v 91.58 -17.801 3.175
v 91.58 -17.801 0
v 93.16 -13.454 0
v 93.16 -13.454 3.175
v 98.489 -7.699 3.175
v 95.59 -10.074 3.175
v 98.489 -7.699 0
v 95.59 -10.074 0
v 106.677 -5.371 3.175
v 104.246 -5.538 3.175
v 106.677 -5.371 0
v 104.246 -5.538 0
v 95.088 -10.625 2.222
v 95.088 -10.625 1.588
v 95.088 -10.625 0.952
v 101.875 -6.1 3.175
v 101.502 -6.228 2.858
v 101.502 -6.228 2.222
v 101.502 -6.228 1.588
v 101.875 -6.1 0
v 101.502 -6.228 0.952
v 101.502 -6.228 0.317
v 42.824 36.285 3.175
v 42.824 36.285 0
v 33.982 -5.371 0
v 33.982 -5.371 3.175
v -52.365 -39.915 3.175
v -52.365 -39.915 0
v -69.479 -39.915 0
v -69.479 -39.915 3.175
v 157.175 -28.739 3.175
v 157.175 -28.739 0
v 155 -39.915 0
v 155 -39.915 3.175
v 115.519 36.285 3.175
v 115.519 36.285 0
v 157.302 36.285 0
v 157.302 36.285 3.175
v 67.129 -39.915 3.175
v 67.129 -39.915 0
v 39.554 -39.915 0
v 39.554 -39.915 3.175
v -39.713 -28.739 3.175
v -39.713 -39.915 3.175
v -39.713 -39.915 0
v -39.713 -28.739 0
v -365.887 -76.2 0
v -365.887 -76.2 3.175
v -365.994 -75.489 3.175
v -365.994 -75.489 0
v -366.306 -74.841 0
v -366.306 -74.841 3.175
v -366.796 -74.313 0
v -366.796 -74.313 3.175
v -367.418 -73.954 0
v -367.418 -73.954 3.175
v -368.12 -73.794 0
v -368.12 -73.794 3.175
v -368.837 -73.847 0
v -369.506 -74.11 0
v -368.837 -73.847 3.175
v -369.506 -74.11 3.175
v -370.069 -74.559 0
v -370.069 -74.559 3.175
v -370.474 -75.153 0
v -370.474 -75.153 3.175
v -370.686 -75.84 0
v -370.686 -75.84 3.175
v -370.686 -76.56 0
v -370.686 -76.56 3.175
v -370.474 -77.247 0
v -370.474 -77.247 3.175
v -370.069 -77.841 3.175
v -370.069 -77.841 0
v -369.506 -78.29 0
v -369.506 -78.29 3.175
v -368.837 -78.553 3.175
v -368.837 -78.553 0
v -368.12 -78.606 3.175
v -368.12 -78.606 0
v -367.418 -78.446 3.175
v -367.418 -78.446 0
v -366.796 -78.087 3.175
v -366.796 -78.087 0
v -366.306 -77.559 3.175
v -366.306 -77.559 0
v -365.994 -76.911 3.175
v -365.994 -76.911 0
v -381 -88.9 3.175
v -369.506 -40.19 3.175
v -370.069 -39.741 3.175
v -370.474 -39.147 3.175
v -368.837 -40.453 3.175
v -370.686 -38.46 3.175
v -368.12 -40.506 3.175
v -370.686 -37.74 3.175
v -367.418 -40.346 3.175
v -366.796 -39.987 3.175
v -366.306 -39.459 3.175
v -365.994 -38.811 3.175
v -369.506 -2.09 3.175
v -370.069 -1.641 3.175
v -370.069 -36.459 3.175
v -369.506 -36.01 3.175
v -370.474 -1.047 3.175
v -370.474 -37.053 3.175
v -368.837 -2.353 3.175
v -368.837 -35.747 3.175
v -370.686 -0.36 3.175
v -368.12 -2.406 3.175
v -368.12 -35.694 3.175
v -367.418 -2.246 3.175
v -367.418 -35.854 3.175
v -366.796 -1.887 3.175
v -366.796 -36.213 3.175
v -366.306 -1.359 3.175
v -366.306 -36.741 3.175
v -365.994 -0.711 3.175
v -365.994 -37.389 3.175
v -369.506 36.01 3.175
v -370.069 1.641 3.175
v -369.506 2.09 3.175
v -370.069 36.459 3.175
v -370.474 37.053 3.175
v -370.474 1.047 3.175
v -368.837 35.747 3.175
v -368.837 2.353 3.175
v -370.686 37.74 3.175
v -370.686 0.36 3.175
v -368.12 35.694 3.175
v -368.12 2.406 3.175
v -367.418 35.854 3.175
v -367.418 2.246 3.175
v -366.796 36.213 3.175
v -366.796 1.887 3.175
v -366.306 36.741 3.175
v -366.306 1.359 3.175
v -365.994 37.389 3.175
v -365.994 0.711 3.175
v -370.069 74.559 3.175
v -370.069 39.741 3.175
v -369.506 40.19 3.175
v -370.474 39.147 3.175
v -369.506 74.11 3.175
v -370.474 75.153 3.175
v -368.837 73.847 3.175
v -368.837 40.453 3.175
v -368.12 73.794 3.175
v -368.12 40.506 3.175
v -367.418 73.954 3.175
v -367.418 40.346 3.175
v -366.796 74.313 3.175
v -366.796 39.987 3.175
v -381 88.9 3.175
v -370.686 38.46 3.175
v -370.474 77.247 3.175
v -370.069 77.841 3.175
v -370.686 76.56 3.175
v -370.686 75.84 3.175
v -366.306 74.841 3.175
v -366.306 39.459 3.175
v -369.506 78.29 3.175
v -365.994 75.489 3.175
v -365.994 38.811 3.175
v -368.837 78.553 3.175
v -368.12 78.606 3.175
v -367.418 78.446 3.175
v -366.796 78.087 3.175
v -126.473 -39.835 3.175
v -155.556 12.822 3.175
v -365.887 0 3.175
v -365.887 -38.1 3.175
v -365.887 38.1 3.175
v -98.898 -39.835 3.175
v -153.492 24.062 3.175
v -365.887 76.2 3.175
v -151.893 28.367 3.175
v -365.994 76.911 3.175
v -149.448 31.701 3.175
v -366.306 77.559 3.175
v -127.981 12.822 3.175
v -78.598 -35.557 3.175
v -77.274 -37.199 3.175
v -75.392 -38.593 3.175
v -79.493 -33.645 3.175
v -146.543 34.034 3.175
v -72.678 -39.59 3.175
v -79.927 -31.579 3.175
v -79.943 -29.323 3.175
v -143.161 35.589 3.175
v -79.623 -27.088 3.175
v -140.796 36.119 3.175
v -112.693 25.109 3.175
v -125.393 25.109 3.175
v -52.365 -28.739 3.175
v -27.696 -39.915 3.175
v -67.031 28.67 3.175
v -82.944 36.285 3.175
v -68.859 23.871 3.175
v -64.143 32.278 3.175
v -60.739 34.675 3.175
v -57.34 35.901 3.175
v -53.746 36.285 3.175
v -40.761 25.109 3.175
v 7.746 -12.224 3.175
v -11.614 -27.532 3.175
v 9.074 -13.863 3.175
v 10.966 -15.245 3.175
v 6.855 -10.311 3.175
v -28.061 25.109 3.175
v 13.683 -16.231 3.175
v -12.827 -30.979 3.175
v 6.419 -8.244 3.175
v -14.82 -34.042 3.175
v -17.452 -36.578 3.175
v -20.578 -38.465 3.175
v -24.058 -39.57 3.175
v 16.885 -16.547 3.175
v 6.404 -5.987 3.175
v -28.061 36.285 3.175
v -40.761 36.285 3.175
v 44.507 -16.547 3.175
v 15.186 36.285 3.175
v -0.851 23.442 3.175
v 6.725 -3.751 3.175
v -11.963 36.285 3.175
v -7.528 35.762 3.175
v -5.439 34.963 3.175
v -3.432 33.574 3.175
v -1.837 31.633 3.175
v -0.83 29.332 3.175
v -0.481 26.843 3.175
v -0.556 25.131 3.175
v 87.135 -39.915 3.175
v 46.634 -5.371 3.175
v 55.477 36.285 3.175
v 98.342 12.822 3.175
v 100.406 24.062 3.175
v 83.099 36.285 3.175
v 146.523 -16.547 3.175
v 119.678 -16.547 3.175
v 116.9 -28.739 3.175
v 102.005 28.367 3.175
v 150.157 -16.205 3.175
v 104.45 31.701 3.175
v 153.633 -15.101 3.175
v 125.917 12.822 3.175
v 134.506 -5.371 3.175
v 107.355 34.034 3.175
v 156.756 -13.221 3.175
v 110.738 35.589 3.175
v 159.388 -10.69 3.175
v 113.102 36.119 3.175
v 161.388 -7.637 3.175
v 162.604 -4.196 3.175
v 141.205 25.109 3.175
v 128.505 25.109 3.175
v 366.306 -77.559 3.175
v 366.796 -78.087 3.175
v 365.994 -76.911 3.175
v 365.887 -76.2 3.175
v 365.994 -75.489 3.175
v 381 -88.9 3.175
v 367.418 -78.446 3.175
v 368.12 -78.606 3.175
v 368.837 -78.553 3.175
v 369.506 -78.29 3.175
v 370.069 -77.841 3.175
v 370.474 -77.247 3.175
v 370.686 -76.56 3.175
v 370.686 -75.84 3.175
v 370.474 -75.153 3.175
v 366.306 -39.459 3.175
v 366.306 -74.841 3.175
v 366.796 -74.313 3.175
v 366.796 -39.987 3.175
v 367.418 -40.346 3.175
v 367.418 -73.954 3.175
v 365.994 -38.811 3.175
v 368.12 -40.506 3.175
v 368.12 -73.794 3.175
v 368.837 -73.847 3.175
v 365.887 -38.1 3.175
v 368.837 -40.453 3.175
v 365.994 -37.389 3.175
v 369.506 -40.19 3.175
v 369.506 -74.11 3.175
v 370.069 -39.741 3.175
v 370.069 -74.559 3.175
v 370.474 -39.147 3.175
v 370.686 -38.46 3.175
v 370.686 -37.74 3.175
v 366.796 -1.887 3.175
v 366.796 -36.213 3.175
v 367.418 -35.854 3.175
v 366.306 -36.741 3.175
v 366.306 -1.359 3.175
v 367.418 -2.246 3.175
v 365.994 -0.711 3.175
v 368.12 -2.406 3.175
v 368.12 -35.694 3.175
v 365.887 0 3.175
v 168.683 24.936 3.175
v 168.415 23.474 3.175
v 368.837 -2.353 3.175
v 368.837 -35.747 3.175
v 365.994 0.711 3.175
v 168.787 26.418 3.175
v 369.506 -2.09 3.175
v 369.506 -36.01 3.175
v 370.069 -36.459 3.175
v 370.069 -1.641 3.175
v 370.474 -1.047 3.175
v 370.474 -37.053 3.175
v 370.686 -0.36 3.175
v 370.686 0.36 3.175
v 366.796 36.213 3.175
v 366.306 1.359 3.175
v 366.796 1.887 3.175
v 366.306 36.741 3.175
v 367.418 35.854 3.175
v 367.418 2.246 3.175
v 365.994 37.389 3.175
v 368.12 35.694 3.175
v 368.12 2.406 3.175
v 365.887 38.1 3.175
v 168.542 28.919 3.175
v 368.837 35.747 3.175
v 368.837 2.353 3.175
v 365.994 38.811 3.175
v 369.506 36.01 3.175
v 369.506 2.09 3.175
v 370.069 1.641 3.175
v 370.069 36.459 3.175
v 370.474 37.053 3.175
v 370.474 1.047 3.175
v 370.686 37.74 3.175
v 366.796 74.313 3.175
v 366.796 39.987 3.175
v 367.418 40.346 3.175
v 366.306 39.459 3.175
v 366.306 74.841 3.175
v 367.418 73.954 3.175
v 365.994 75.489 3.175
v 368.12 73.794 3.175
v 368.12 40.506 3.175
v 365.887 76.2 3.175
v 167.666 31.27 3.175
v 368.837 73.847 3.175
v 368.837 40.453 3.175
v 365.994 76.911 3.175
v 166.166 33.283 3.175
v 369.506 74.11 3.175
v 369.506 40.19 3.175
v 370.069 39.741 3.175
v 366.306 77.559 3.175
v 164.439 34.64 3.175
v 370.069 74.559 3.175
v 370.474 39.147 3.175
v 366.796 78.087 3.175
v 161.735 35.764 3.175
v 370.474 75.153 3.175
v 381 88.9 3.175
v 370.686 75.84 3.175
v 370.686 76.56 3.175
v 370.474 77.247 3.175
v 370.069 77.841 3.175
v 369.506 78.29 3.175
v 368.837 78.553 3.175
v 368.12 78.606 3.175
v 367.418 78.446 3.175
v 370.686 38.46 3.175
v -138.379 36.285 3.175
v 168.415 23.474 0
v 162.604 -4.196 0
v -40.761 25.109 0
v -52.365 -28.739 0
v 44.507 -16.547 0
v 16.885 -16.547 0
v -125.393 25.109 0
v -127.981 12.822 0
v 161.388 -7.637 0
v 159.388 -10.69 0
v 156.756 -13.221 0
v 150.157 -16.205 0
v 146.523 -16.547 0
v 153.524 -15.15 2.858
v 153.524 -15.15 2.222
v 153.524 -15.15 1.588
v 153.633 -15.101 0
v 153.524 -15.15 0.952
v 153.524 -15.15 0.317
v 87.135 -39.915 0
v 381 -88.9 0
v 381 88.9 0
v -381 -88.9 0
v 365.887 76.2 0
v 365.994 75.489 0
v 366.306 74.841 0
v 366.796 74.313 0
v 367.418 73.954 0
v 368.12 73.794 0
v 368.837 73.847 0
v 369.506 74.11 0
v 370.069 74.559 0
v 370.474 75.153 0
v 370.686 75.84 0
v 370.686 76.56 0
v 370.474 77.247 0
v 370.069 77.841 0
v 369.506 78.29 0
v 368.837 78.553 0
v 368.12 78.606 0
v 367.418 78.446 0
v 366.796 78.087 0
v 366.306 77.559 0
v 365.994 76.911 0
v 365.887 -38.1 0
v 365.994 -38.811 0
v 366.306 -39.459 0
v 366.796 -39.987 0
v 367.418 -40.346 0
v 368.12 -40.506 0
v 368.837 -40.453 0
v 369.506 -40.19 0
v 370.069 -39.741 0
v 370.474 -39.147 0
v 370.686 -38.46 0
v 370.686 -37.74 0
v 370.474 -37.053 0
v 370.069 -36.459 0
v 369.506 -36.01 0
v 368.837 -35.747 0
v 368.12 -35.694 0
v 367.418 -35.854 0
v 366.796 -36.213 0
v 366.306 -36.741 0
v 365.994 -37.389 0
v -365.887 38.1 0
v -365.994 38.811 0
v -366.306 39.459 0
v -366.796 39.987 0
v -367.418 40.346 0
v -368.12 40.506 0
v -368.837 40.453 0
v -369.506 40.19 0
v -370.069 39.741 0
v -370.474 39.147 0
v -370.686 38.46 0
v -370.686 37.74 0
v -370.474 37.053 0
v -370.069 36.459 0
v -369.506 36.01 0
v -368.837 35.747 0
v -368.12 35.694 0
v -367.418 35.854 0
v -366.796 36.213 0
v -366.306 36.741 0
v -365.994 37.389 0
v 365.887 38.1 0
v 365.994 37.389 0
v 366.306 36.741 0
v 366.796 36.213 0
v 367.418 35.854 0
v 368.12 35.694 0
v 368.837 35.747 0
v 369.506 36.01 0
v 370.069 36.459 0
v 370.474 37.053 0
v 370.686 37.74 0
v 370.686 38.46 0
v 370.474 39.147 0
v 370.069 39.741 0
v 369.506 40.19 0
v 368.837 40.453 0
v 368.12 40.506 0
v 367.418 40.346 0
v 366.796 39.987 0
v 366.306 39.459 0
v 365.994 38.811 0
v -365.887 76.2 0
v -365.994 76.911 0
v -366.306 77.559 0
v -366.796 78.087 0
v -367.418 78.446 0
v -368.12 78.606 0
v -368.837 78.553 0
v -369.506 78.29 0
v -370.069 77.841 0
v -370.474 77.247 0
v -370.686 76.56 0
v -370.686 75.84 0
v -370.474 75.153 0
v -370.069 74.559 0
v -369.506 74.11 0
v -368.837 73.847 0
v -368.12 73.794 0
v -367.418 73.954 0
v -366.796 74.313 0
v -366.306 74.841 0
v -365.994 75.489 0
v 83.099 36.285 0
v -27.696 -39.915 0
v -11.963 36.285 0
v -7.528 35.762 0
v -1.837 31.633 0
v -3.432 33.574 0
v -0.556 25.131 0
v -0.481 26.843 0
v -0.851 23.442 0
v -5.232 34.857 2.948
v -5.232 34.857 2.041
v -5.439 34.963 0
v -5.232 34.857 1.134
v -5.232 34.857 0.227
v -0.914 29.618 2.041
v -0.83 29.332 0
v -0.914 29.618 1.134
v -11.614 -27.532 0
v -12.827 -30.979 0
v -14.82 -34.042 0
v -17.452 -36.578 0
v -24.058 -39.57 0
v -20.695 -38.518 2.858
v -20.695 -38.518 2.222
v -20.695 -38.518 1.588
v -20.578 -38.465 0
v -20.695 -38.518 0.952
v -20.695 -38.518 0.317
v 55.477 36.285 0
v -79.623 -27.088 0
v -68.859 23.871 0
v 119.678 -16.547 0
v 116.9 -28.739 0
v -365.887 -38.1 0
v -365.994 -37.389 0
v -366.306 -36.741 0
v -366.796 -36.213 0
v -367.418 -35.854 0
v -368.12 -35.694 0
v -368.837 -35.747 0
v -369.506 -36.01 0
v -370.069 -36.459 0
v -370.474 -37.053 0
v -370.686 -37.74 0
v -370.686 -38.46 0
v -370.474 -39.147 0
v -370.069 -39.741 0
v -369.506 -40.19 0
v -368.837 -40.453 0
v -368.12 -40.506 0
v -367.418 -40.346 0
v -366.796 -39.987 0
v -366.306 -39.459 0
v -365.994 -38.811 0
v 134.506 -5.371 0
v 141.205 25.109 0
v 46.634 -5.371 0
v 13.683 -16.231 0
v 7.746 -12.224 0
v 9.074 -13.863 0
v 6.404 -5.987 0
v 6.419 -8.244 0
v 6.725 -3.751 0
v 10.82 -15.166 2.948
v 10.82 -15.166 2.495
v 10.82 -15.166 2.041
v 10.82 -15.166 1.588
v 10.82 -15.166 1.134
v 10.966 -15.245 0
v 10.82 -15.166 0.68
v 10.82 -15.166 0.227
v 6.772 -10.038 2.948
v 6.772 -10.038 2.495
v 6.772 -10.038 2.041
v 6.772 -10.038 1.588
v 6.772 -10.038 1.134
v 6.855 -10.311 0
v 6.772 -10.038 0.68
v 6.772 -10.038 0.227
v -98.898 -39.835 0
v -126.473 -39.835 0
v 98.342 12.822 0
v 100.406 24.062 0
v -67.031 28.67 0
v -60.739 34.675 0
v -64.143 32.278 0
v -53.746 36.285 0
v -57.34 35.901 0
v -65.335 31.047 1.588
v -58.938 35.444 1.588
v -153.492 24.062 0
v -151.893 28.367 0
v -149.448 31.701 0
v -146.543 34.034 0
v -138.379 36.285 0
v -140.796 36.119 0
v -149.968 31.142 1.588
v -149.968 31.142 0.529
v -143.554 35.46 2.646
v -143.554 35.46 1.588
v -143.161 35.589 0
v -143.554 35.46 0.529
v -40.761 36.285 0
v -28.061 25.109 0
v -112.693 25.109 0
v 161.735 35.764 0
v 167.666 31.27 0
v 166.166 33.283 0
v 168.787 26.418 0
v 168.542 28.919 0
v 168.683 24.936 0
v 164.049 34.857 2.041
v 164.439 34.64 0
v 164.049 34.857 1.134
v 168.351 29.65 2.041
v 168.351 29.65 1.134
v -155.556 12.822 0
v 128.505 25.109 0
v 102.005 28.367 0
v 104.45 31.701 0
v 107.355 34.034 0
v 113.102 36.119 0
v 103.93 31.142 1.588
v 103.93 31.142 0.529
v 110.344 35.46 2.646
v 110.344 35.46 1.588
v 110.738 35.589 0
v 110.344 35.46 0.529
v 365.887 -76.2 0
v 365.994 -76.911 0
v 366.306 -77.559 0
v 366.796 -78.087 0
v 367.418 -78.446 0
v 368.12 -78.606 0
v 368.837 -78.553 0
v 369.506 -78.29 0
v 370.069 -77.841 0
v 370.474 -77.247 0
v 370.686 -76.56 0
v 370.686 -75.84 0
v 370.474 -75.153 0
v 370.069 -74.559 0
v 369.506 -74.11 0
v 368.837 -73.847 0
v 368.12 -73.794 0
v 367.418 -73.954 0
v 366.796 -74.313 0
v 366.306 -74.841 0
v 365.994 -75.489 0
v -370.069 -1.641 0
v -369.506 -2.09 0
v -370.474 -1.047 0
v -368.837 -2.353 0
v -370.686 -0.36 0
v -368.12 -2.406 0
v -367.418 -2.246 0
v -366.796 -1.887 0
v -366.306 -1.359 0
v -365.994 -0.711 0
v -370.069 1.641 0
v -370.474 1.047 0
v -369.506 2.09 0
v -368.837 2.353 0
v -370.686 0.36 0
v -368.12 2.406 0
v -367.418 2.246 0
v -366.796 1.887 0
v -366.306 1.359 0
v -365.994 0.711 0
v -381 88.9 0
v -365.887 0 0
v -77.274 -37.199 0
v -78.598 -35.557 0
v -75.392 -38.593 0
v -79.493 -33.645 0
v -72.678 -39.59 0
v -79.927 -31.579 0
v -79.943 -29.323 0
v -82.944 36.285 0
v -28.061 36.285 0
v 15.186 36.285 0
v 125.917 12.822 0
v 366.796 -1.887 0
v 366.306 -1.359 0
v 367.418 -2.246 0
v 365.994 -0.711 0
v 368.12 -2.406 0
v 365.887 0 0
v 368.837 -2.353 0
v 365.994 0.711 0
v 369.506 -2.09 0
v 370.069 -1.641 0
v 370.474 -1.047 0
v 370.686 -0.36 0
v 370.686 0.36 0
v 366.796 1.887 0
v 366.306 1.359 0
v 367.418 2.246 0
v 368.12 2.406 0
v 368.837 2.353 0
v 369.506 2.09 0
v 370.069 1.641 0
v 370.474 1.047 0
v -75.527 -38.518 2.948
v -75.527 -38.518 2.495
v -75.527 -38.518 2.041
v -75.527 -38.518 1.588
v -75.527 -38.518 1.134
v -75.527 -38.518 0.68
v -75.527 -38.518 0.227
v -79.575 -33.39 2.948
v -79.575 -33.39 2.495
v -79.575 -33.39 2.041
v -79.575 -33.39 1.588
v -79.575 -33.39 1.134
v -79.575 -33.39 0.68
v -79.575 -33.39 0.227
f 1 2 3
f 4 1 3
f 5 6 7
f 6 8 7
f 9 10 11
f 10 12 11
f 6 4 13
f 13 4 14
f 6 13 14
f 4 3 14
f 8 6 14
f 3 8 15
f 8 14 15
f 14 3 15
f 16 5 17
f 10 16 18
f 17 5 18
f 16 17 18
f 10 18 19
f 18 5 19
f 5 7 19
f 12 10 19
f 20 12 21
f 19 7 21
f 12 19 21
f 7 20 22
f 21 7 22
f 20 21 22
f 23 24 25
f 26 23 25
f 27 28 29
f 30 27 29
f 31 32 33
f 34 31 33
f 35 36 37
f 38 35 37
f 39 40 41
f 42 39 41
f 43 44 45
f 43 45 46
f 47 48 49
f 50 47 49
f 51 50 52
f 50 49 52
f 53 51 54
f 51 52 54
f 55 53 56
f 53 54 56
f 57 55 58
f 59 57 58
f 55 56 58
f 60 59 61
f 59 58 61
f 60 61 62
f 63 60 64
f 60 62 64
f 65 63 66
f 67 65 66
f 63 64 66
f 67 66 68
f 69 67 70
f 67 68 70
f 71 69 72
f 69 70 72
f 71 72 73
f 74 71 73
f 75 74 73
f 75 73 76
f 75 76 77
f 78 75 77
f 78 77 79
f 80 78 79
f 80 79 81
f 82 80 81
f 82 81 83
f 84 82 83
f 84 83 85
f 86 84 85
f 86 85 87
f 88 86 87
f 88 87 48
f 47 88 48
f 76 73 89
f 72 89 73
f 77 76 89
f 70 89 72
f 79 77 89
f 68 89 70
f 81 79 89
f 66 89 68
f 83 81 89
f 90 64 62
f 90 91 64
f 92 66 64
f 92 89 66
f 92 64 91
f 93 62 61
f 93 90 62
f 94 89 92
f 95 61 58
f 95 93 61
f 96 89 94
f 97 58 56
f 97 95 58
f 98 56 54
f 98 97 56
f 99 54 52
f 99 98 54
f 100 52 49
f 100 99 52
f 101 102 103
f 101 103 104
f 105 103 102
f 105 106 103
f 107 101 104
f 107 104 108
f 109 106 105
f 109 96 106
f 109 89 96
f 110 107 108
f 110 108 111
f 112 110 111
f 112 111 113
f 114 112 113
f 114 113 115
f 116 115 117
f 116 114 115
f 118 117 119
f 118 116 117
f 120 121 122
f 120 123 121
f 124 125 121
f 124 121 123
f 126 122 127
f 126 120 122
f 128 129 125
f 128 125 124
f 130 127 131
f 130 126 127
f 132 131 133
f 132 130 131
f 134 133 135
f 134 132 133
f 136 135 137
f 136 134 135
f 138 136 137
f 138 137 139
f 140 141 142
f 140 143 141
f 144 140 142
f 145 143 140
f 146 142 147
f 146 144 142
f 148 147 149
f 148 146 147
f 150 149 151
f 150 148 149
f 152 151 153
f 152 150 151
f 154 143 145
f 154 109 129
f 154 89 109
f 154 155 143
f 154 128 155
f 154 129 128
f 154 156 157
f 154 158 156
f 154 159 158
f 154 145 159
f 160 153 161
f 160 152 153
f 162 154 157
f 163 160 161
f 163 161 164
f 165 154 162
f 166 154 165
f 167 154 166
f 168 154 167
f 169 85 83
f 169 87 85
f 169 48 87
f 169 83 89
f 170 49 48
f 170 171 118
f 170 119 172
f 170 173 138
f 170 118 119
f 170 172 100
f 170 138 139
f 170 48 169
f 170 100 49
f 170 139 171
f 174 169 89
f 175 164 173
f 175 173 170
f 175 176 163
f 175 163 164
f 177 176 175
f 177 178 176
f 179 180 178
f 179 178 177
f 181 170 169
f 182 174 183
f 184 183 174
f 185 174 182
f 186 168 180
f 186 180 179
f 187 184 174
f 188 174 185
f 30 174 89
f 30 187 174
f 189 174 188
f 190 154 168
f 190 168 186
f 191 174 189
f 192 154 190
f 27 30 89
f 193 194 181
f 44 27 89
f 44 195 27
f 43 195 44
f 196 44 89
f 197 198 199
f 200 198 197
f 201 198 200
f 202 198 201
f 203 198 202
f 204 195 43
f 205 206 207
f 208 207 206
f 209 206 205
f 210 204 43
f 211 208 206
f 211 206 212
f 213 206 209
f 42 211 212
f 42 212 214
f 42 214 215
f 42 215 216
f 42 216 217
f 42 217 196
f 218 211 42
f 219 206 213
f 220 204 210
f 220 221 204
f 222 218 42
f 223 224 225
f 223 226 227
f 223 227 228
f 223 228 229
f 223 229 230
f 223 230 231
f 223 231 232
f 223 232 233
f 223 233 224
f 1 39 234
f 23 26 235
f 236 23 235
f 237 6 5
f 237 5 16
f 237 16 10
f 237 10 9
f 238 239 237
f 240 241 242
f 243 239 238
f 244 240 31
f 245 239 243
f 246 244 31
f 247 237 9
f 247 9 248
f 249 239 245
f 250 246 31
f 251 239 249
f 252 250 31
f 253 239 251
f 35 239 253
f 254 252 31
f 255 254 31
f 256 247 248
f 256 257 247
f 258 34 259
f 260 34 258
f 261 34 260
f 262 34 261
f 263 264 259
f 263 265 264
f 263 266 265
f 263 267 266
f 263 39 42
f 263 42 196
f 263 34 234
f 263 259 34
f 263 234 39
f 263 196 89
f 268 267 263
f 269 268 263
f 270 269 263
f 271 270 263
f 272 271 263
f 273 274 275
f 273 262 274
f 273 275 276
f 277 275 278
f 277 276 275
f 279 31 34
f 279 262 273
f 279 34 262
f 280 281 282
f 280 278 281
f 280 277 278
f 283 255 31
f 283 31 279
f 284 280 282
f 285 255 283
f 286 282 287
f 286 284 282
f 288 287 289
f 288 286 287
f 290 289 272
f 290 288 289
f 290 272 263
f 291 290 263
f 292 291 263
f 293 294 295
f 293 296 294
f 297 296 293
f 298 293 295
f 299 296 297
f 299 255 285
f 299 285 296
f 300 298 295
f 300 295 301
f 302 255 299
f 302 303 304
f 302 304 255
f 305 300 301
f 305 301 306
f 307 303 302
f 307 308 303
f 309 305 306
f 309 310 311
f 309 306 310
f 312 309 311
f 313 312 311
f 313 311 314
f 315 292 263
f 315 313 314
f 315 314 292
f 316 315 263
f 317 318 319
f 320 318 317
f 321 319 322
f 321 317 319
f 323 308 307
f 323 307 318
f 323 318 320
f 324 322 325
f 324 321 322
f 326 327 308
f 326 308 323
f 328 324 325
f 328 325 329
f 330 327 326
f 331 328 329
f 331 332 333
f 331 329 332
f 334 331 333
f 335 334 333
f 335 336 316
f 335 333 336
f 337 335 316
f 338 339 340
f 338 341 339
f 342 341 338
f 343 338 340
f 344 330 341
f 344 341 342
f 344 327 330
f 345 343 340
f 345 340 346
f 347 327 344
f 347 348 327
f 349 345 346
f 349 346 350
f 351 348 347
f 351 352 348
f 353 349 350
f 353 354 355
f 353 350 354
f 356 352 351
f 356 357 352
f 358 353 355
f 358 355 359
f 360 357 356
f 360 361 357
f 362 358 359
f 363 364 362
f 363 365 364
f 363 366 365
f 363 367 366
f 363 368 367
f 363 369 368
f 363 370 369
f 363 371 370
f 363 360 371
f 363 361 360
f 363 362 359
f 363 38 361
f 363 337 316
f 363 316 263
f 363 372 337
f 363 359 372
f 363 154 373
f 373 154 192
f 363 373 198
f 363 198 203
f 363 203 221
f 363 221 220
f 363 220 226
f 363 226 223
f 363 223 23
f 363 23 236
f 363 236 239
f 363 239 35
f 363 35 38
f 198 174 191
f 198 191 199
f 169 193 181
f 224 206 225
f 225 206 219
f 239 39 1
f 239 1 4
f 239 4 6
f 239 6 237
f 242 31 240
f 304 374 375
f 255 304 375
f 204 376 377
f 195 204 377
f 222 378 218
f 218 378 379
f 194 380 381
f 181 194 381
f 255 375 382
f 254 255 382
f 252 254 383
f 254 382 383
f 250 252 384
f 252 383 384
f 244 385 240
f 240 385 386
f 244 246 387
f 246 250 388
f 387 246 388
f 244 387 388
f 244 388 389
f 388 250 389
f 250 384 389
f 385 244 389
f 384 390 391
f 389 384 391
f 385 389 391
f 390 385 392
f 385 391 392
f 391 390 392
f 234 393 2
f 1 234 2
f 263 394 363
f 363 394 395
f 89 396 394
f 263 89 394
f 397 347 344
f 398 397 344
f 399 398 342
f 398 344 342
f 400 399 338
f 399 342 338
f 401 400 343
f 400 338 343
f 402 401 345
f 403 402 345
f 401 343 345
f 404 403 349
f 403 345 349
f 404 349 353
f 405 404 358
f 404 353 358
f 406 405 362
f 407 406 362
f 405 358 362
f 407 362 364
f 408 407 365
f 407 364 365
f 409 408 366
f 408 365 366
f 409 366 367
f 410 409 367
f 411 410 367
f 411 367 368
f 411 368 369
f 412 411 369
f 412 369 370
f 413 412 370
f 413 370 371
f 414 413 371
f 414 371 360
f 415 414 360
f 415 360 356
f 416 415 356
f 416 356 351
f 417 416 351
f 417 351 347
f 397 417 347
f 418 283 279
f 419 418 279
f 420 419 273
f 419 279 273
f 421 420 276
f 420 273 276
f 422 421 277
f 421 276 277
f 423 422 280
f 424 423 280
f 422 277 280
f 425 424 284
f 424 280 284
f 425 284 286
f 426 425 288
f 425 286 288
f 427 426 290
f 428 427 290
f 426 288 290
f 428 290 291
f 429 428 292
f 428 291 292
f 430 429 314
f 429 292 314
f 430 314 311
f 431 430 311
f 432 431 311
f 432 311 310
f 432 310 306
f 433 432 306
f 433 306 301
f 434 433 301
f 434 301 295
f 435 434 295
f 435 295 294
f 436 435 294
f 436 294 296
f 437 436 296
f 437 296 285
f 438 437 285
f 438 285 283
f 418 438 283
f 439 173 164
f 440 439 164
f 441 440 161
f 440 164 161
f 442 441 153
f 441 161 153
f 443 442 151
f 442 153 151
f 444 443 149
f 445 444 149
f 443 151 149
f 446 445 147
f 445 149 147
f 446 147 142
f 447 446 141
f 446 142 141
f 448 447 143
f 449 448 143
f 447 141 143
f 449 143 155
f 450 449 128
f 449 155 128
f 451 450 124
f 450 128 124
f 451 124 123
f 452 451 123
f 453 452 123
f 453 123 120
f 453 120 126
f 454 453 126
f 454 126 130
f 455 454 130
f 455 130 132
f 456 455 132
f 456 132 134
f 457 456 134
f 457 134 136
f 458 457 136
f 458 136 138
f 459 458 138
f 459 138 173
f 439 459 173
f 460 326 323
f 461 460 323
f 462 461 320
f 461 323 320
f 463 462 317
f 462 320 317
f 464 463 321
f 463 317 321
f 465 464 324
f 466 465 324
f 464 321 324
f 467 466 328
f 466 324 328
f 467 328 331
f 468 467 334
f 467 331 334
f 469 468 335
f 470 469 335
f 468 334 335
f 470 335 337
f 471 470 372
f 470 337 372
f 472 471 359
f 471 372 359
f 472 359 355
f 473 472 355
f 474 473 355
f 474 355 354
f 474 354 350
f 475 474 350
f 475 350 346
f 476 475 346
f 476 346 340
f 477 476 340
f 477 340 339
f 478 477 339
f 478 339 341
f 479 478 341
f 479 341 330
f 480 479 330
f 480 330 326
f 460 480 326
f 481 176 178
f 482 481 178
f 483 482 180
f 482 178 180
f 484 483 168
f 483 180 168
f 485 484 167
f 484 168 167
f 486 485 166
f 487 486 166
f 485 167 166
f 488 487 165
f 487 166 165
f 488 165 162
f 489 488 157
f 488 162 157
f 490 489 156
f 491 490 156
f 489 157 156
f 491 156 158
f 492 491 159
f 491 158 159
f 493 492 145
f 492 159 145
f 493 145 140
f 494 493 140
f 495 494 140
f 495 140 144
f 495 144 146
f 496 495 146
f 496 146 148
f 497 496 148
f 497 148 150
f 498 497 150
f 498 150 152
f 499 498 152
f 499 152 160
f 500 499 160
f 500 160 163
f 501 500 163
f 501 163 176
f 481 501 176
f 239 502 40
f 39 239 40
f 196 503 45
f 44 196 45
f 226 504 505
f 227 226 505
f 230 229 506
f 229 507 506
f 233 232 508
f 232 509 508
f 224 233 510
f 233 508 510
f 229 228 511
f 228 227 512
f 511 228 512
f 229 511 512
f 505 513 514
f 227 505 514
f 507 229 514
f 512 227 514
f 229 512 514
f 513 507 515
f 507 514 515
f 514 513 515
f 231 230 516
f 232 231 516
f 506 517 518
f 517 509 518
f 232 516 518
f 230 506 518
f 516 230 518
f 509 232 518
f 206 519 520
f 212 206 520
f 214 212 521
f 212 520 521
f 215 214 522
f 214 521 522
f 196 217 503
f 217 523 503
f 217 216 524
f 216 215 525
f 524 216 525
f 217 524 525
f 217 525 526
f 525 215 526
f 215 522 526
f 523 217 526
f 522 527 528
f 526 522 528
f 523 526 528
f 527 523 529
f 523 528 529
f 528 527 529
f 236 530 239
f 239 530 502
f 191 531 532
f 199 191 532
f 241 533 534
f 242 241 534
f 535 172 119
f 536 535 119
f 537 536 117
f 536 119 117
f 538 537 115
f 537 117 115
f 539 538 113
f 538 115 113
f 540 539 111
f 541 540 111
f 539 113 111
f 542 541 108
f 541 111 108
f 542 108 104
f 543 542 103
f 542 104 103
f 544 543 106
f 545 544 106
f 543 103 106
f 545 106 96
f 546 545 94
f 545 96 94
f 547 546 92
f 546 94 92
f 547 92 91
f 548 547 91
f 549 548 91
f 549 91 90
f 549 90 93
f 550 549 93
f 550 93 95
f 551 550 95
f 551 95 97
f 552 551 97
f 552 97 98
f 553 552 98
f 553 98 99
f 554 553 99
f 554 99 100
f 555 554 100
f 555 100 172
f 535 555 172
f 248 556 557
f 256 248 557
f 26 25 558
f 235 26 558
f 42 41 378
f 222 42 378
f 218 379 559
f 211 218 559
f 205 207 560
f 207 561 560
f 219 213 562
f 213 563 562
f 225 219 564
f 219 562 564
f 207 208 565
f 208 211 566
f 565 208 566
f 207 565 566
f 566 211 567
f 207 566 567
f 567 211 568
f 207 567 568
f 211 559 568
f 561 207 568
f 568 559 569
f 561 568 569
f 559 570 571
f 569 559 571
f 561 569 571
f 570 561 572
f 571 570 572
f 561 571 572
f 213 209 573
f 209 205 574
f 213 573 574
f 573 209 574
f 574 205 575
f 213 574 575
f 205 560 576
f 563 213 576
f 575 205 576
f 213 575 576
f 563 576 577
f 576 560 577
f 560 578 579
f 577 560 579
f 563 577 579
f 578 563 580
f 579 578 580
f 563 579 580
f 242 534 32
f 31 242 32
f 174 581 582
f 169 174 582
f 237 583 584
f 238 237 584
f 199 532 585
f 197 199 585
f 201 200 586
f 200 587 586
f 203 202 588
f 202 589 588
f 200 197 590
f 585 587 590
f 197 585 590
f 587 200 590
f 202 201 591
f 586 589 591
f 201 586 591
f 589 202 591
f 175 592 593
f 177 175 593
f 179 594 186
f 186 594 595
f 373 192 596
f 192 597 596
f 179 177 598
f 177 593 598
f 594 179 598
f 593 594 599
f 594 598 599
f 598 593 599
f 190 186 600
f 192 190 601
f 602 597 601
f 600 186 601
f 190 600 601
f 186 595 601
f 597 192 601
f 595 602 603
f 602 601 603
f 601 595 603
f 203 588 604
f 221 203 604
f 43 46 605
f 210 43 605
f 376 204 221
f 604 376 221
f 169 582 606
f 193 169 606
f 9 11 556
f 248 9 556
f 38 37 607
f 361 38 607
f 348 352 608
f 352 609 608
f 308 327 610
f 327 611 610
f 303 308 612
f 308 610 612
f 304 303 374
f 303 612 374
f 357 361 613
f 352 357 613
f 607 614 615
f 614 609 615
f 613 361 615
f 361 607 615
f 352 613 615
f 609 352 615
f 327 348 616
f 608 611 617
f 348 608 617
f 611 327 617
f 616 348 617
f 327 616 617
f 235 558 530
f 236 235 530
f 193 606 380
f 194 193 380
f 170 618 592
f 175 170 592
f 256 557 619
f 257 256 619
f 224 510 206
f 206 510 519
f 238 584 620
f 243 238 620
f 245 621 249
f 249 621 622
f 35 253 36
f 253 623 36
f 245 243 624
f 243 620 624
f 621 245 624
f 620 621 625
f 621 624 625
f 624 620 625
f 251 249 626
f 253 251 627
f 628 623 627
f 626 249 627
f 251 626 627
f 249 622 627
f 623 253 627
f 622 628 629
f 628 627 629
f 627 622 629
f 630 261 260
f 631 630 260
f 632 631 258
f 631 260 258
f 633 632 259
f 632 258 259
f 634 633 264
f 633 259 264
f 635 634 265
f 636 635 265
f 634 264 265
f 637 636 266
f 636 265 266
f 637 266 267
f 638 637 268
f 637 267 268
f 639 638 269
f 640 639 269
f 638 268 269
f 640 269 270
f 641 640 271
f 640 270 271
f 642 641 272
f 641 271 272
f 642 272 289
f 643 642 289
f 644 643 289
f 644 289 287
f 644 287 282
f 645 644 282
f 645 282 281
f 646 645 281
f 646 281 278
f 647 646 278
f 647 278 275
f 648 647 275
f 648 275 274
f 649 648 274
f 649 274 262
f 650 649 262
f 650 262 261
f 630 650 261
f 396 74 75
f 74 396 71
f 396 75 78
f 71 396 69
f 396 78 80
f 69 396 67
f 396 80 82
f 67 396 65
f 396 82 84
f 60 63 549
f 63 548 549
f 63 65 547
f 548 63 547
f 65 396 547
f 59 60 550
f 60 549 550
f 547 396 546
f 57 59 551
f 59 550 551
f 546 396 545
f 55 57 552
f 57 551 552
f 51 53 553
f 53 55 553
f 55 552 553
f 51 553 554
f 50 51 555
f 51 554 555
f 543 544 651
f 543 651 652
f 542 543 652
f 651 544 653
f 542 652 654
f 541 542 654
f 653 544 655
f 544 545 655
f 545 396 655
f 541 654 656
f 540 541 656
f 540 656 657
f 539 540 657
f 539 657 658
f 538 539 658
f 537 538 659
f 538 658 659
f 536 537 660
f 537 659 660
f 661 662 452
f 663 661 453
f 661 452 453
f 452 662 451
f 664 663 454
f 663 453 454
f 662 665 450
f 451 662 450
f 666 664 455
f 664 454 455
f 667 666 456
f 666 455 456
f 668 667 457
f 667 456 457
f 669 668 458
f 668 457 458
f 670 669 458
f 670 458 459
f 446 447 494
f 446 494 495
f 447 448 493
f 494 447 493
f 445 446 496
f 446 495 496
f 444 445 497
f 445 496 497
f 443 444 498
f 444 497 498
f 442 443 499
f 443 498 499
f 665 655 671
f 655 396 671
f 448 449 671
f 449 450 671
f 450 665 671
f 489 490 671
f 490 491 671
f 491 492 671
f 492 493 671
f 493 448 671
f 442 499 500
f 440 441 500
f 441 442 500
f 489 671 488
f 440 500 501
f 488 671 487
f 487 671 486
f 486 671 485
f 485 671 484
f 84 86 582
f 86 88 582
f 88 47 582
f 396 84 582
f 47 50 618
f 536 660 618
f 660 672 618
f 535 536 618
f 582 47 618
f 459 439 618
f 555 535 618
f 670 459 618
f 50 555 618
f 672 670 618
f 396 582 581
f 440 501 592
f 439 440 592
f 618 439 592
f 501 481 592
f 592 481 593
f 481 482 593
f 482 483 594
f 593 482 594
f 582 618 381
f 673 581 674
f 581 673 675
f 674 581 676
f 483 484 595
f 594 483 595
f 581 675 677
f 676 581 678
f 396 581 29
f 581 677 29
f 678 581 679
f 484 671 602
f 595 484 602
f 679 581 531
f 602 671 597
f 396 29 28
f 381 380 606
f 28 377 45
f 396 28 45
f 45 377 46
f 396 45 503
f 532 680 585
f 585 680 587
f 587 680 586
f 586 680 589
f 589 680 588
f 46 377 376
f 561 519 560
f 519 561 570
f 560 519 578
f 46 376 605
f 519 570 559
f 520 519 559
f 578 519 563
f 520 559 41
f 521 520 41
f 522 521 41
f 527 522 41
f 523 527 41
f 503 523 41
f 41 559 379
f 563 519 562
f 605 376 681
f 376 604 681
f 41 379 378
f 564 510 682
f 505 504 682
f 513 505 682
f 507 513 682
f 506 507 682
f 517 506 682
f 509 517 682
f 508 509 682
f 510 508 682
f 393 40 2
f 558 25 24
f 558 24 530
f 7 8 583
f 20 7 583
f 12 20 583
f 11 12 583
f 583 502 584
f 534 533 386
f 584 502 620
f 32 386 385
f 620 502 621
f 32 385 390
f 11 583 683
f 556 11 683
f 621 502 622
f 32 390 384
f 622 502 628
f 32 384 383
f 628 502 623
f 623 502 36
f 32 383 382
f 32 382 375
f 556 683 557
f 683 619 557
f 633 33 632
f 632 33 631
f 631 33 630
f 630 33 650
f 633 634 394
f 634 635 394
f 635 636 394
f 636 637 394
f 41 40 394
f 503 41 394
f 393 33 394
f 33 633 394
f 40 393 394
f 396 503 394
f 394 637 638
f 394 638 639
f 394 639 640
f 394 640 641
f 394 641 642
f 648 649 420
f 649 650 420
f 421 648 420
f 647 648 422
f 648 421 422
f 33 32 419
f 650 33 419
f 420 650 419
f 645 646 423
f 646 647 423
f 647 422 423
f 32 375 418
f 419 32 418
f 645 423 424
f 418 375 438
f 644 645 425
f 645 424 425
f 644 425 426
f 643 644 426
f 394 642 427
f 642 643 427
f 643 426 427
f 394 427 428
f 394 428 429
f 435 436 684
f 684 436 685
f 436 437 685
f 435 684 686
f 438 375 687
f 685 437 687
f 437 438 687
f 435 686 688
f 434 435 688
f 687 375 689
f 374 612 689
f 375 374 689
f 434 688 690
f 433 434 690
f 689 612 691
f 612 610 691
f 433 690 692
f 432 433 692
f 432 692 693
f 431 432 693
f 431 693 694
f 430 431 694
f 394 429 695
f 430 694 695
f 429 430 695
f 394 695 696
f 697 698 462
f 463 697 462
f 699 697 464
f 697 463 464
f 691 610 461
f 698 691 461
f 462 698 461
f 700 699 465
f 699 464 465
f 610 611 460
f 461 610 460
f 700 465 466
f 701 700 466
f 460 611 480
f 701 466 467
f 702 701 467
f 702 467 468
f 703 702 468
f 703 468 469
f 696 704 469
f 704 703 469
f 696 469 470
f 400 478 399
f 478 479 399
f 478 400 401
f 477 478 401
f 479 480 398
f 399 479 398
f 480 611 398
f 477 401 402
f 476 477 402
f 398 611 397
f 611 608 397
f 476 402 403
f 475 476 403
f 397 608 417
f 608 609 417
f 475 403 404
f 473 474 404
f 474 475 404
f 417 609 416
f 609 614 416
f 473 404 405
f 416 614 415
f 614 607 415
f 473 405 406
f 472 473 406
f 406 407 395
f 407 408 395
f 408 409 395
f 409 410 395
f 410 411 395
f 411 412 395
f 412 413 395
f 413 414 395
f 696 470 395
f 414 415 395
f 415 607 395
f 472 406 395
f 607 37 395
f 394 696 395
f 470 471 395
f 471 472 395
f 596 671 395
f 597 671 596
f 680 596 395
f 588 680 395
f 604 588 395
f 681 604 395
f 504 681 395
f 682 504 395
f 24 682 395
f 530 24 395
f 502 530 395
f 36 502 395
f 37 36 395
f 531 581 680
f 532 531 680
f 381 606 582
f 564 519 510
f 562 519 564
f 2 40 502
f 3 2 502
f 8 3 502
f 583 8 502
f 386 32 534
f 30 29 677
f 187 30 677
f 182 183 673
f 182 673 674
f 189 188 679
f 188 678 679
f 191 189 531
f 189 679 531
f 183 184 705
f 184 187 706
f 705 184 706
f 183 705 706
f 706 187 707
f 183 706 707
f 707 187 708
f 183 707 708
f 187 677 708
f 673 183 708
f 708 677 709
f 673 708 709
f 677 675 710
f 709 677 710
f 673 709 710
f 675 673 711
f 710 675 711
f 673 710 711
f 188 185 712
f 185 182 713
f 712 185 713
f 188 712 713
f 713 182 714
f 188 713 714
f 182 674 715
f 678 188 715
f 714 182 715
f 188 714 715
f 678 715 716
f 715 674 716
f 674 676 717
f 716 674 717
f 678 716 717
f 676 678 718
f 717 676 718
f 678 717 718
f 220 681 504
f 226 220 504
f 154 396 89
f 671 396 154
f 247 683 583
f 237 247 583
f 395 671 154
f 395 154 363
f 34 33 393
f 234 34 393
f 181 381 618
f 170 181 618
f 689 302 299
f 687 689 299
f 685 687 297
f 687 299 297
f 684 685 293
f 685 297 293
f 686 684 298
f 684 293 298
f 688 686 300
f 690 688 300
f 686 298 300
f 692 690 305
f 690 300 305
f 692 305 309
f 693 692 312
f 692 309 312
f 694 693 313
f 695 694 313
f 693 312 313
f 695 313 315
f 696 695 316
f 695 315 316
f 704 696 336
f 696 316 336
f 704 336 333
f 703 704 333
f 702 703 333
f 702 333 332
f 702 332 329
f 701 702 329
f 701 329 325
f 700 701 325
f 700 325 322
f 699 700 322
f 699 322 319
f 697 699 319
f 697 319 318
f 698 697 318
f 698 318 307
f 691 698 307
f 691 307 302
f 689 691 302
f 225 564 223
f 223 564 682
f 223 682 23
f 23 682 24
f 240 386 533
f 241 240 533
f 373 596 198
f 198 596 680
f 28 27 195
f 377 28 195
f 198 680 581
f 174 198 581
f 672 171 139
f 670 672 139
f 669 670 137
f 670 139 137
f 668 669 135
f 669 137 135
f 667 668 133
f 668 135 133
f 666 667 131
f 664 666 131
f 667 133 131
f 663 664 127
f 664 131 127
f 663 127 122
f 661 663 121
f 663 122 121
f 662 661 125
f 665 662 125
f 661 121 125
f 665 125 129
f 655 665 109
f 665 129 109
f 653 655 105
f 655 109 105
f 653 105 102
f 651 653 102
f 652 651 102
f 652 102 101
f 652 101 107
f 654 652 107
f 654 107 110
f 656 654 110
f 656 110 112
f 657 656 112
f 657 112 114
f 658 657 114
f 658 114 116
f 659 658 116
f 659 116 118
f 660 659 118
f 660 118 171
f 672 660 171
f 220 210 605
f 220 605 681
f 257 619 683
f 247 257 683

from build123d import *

# Parameters (mm, degrees)
SKETCH1_W             = 762
SKETCH1_H             = 177.8
BOSS_EXTRUDE1_DEPTH   = 3.175
BOSS_EXTRUDE1_2_DEPTH = 3.175
SKETCH2_W             = 12.7
SKETCH2_H             = 25.198455275
SKETCH2_W_2           = 12.652375
SKETCH2_H_2           = 20.883441122
BOSS_EXTRUDE2_DEPTH   = 3.175
SKETCH3_R             = 2.413
CUT_EXTRUDE1_DEPTH    = 392.247096756


with BuildPart() as part:
    # Sketch1 → Boss-Extrude1 (new body)
    with BuildSketch(Plane.XY):
        Rectangle(SKETCH1_W, SKETCH1_H)
        with BuildLine():
            Line((-98.898075, -39.835315096), (-126.47295, -39.835315096))
            Line((-126.47295, -39.835315096), (-112.69345, 25.109309904))
            Line((-112.69345, 25.109309904), (-125.39345, 25.109309904))
            Line((-125.39345, 25.109309904), (-127.981075, 12.822059904))
            Line((-127.981075, 12.822059904), (-155.55595, 12.822059904))
            Line((-155.55595, 12.822059904), (-153.4922, 24.061559904))
            add(Edge.make_bspline(
                [(-153.4922, 24.061559904), (-153.114009041, 25.826838845), (-152.107111159, 28.330892524), (-150.018844738, 31.208697921), (-148.110526346, 33.000169059), (-145.952379495, 34.474150169), (-142.756393957, 35.899752111), (-140.131656162, 36.29243254), (-138.3792, 36.285309904)],
                knots=[0, 0, 0, 0, 0.256781092, 0.379270402, 0.504103305, 0.627938883, 0.75015623, 1, 1, 1, 1], degree=3))
            Line((-138.3792, 36.285309904), (-82.9437, 36.285309904))
            Line((-82.9437, 36.285309904), (-98.898075, -39.835315096))
        make_face(mode=Mode.SUBTRACT)
        with BuildLine():
            Line((-27.695525, -39.914690096), (-69.478525, -39.914690096))
            add(Edge.make_bspline(
                [(-69.478525, -39.914690096), (-70.378419778, -39.890724934), (-71.704855295, -39.834182103), (-73.367269691, -39.428139507), (-74.4978262, -39.054475963), (-75.523062052, -38.544153837), (-76.467505593, -37.933458517), (-77.303402375, -37.199179804), (-78.055411522, -36.372825302), (-78.694544311, -35.450572391), (-79.192076882, -34.444787097), (-79.609552025, -33.388191923), (-79.846110554, -32.250761591), (-80.002676754, -31.050614438), (-79.979776999, -29.310279003), (-79.819248509, -27.981119838), (-79.62265, -27.087690096)],
                knots=[0, 0, 0, 0, 0.140211227, 0.204364429, 0.265147851, 0.324658092, 0.381613589, 0.439257912, 0.496831965, 0.554704074, 0.612744983, 0.670716103, 0.730497823, 0.792544611, 0.858256418, 1, 1, 1, 1], degree=3))
            Line((-79.62265, -27.087690096), (-68.8594, 23.871059904))
            add(Edge.make_bspline(
                [(-68.8594, 23.871059904), (-68.462815939, 25.643057301), (-67.505422501, 28.206697467), (-65.384523981, 31.101105561), (-63.495671972, 32.940400282), (-61.340054695, 34.44245551), (-58.13780239, 35.889129542), (-55.506378001, 36.299143413), (-53.7464, 36.285309904)],
                knots=[0, 0, 0, 0, 0.257514098, 0.38084006, 0.505341434, 0.629198731, 0.750909855, 1, 1, 1, 1], degree=3))
            Line((-53.7464, 36.285309904), (-11.9634, 36.285309904))
            add(Edge.make_bspline(
                [(-11.9634, 36.285309904), (-10.951206406, 36.265095396), (-9.472034389, 36.198930496), (-7.598624422, 35.809565279), (-6.362047596, 35.393919508), (-5.226995923, 34.884334314), (-4.209362568, 34.252182113), (-3.309508264, 33.490388009), (-2.517821843, 32.639137402), (-1.849309358, 31.697562392), (-1.305537987, 30.689972363), (-0.888869485, 29.624844052), (-0.618683845, 28.492151076), (-0.479667068, 27.309465242), (-0.461795302, 25.606385314), (-0.640427295, 24.310954775), (-0.8509, 23.442434904)],
                knots=[0, 0, 0, 0, 0.150988733, 0.2194496, 0.284234088, 0.344880513, 0.404348422, 0.461954929, 0.519942779, 0.577007859, 0.633416367, 0.690044579, 0.746804204, 0.806324292, 0.867001421, 1, 1, 1, 1], degree=3))
            Line((-0.8509, 23.442434904), (-11.61415, -27.532190096))
            add(Edge.make_bspline(
                [(-11.61415, -27.532190096), (-11.987729804, -29.240567183), (-13.011146829, -31.705361087), (-15.153529873, -34.541520304), (-16.794536644, -36.112916543), (-18.285460276, -37.193344942), (-19.453657133, -37.934268454), (-20.694525744, -38.533784236), (-21.977681798, -39.054718418), (-23.334799484, -39.420538407), (-25.229442597, -39.826610751), (-26.705398031, -39.890467006), (-27.695525, -39.914690096)],
                knots=[0, 0, 0, 0, 0.238595474, 0.358933013, 0.483744219, 0.547388327, 0.610400664, 0.672497519, 0.7354808, 0.799354582, 0.864312251, 1, 1, 1, 1], degree=3))
        make_face(mode=Mode.SUBTRACT)
        with BuildLine():
            Line((42.8244, 36.285309904), (33.982025, -5.370690096))
            Line((33.982025, -5.370690096), (46.6344, -5.370690096))
            Line((46.6344, -5.370690096), (55.476775, 36.285309904))
            Line((55.476775, 36.285309904), (83.099275, 36.285309904))
            Line((83.099275, 36.285309904), (67.129025, -39.914690096))
            Line((67.129025, -39.914690096), (39.55415, -39.914690096))
            Line((39.55415, -39.914690096), (44.50715, -16.546690096))
            Line((44.50715, -16.546690096), (16.88465, -16.546690096))
            add(Edge.make_bspline(
                [(16.88465, -16.546690096), (15.97397184, -16.566803466), (14.654465721, -16.442849527), (12.969679896, -16.084165205), (11.848493473, -15.685263746), (10.814508554, -15.187184105), (9.866010852, -14.585783269), (9.028628771, -13.846530809), (8.274838484, -13.021287426), (7.643672663, -12.100509132), (7.126661545, -11.105170566), (6.749218091, -10.040732714), (6.496795936, -8.910572682), (6.345702881, -7.71402033), (6.366723836, -5.974283719), (6.528488375, -4.644730591), (6.72465, -3.751440096)],
                knots=[0, 0, 0, 0, 0.141055917, 0.205006137, 0.266817017, 0.325211674, 0.382839171, 0.440466668, 0.498023916, 0.555879133, 0.613172181, 0.671613009, 0.730576487, 0.792605165, 0.858297791, 1, 1, 1, 1], degree=3))
            Line((6.72465, -3.751440096), (15.186025, 36.285309904))
            Line((15.186025, 36.285309904), (42.8244, 36.285309904))
        make_face(mode=Mode.SUBTRACT)
        with BuildLine():
            Line((116.900325, -28.738690096), (157.1752, -28.738690096))
            Line((157.1752, -28.738690096), (155.000325, -39.914690096))
            Line((155.000325, -39.914690096), (87.1347, -39.914690096))
            Line((87.1347, -39.914690096), (91.5797, -17.800815096))
            add(Edge.make_bspline(
                [(91.5797, -17.800815096), (91.970731994, -16.024994145), (92.943076158, -13.475373477), (95.037802627, -10.562190947), (96.626678786, -9.030826572), (98.04129727, -7.984571288), (99.140031696, -7.270780811), (100.298338787, -6.689209352), (101.495760204, -6.213878956), (102.724230789, -5.824722646), (104.446719435, -5.462579309), (105.778975302, -5.364834977), (106.676825, -5.370690096)],
                knots=[0, 0, 0, 0, 0.257512197, 0.380397285, 0.505435299, 0.568066423, 0.629375226, 0.690688606, 0.751204987, 0.811628551, 0.872900724, 1, 1, 1, 1], degree=3))
            Line((106.676825, -5.370690096), (134.5057, -5.370690096))
            Line((134.5057, -5.370690096), (141.20495, 25.109309904))
            Line((141.20495, 25.109309904), (128.50495, 25.109309904))
            Line((128.50495, 25.109309904), (125.917325, 12.822059904))
            Line((125.917325, 12.822059904), (98.34245, 12.822059904))
            Line((98.34245, 12.822059904), (100.4062, 24.061559904))
            add(Edge.make_bspline(
                [(100.4062, 24.061559904), (100.784390959, 25.826838845), (101.791288841, 28.330892524), (103.879555262, 31.208697921), (105.787873654, 33.000169059), (107.946020505, 34.474150169), (111.142006043, 35.899752111), (113.766743838, 36.29243254), (115.5192, 36.285309904)],
                knots=[0, 0, 0, 0, 0.256781092, 0.379270402, 0.504103305, 0.627938883, 0.75015623, 1, 1, 1, 1], degree=3))
            Line((115.5192, 36.285309904), (157.3022, 36.285309904))
            add(Edge.make_bspline(
                [(157.3022, 36.285309904), (158.313404759, 36.262334312), (159.795356307, 36.203930585), (161.662996805, 35.803296989), (162.915290146, 35.415626042), (164.04161951, 34.88092493), (165.077257642, 34.2714369), (165.971103509, 33.504855616), (166.764093589, 32.655469989), (167.431275951, 31.713004044), (167.97575393, 30.713137791), (168.378470101, 29.644245275), (168.643854599, 28.518162675), (168.787088091, 27.33606961), (168.802987002, 25.638048994), (168.625616664, 24.342751641), (168.4147, 23.474184904)],
                knots=[0, 0, 0, 0, 0.151086534, 0.219591746, 0.284173196, 0.345905024, 0.404997354, 0.462641174, 0.520666586, 0.577768628, 0.634213675, 0.689860087, 0.747422966, 0.80619884, 0.866915273, 1, 1, 1, 1], degree=3))
            Line((168.4147, 23.474184904), (162.60445, -4.195940096))
            add(Edge.make_bspline(
                [(162.60445, -4.195940096), (162.222762109, -5.895405939), (161.212748067, -8.357775045), (159.060484323, -11.176073851), (157.423570654, -12.736969042), (155.946992387, -13.829638667), (154.777335182, -14.570198188), (153.527544548, -15.162182906), (152.245499952, -15.683808477), (150.890272205, -16.057436379), (148.993426207, -16.45398034), (147.513691649, -16.524751422), (146.523075, -16.546690096)],
                knots=[0, 0, 0, 0, 0.238188423, 0.358091, 0.48305048, 0.546187513, 0.609274708, 0.67209543, 0.735153534, 0.798406705, 0.864151056, 1, 1, 1, 1], degree=3))
            Line((146.523075, -16.546690096), (119.67845, -16.546690096))
            Line((119.67845, -16.546690096), (116.900325, -28.738690096))
        make_face(mode=Mode.SUBTRACT)
    extrude(amount=BOSS_EXTRUDE1_DEPTH)



with BuildPart() as body_2:
    # Sketch1 → Boss-Extrude1 2 (new body)
    with BuildSketch(Plane.XY):
        Polygon((-40.76065, 25.109309904), (-52.365275, -28.738690096), (-39.7129, -28.738690096), (-28.06065, 25.109309904), align=None)
    extrude(amount=BOSS_EXTRUDE1_2_DEPTH)


with BuildPart() as part_1:
    add(part.part)

    add(body_2.part)  # Boss-Extrude2 merges body 2
    # Sketch2 → Boss-Extrude2 (add)
    with BuildSketch(Plane.XY.offset(3.175)):
        with Locations((-34.41065, 37.708537542)):
            Rectangle(SKETCH2_W, SKETCH2_H)
        with Locations((-46.0390875, -39.180410657)):
            Rectangle(SKETCH2_W_2, SKETCH2_H_2)
    extrude(amount=-BOSS_EXTRUDE2_DEPTH)

    # Sketch3 → Cut-Extrude1 (cut, through all)
    with BuildSketch(Plane.XY.offset(3.175)):
        with Locations((-368.3, 76.2)):
            Circle(SKETCH3_R)
        with Locations((-368.3, 38.1)):
            Circle(SKETCH3_R)
        with Locations((-368.3, 0)):
            Circle(SKETCH3_R)
        with Locations((-368.3, -38.1)):
            Circle(SKETCH3_R)
        with Locations((-368.3, -76.2)):
            Circle(SKETCH3_R)
        with Locations(Location((368.3, -76.2, 0), (0, 0, 180))):
            Circle(SKETCH3_R)
        with Locations(Location((368.3, -38.1, 0), (0, 0, 180))):
            Circle(SKETCH3_R)
        with Locations(Location((368.3, 0, 0), (0, 0, 180))):
            Circle(SKETCH3_R)
        with Locations(Location((368.3, 38.1, 0), (0, 0, 180))):
            Circle(SKETCH3_R)
        with Locations(Location((368.3, 76.2, 0), (0, 0, 180))):
            Circle(SKETCH3_R)
    extrude(amount=-CUT_EXTRUDE1_DEPTH, mode=Mode.SUBTRACT)


solid = part_1.part
